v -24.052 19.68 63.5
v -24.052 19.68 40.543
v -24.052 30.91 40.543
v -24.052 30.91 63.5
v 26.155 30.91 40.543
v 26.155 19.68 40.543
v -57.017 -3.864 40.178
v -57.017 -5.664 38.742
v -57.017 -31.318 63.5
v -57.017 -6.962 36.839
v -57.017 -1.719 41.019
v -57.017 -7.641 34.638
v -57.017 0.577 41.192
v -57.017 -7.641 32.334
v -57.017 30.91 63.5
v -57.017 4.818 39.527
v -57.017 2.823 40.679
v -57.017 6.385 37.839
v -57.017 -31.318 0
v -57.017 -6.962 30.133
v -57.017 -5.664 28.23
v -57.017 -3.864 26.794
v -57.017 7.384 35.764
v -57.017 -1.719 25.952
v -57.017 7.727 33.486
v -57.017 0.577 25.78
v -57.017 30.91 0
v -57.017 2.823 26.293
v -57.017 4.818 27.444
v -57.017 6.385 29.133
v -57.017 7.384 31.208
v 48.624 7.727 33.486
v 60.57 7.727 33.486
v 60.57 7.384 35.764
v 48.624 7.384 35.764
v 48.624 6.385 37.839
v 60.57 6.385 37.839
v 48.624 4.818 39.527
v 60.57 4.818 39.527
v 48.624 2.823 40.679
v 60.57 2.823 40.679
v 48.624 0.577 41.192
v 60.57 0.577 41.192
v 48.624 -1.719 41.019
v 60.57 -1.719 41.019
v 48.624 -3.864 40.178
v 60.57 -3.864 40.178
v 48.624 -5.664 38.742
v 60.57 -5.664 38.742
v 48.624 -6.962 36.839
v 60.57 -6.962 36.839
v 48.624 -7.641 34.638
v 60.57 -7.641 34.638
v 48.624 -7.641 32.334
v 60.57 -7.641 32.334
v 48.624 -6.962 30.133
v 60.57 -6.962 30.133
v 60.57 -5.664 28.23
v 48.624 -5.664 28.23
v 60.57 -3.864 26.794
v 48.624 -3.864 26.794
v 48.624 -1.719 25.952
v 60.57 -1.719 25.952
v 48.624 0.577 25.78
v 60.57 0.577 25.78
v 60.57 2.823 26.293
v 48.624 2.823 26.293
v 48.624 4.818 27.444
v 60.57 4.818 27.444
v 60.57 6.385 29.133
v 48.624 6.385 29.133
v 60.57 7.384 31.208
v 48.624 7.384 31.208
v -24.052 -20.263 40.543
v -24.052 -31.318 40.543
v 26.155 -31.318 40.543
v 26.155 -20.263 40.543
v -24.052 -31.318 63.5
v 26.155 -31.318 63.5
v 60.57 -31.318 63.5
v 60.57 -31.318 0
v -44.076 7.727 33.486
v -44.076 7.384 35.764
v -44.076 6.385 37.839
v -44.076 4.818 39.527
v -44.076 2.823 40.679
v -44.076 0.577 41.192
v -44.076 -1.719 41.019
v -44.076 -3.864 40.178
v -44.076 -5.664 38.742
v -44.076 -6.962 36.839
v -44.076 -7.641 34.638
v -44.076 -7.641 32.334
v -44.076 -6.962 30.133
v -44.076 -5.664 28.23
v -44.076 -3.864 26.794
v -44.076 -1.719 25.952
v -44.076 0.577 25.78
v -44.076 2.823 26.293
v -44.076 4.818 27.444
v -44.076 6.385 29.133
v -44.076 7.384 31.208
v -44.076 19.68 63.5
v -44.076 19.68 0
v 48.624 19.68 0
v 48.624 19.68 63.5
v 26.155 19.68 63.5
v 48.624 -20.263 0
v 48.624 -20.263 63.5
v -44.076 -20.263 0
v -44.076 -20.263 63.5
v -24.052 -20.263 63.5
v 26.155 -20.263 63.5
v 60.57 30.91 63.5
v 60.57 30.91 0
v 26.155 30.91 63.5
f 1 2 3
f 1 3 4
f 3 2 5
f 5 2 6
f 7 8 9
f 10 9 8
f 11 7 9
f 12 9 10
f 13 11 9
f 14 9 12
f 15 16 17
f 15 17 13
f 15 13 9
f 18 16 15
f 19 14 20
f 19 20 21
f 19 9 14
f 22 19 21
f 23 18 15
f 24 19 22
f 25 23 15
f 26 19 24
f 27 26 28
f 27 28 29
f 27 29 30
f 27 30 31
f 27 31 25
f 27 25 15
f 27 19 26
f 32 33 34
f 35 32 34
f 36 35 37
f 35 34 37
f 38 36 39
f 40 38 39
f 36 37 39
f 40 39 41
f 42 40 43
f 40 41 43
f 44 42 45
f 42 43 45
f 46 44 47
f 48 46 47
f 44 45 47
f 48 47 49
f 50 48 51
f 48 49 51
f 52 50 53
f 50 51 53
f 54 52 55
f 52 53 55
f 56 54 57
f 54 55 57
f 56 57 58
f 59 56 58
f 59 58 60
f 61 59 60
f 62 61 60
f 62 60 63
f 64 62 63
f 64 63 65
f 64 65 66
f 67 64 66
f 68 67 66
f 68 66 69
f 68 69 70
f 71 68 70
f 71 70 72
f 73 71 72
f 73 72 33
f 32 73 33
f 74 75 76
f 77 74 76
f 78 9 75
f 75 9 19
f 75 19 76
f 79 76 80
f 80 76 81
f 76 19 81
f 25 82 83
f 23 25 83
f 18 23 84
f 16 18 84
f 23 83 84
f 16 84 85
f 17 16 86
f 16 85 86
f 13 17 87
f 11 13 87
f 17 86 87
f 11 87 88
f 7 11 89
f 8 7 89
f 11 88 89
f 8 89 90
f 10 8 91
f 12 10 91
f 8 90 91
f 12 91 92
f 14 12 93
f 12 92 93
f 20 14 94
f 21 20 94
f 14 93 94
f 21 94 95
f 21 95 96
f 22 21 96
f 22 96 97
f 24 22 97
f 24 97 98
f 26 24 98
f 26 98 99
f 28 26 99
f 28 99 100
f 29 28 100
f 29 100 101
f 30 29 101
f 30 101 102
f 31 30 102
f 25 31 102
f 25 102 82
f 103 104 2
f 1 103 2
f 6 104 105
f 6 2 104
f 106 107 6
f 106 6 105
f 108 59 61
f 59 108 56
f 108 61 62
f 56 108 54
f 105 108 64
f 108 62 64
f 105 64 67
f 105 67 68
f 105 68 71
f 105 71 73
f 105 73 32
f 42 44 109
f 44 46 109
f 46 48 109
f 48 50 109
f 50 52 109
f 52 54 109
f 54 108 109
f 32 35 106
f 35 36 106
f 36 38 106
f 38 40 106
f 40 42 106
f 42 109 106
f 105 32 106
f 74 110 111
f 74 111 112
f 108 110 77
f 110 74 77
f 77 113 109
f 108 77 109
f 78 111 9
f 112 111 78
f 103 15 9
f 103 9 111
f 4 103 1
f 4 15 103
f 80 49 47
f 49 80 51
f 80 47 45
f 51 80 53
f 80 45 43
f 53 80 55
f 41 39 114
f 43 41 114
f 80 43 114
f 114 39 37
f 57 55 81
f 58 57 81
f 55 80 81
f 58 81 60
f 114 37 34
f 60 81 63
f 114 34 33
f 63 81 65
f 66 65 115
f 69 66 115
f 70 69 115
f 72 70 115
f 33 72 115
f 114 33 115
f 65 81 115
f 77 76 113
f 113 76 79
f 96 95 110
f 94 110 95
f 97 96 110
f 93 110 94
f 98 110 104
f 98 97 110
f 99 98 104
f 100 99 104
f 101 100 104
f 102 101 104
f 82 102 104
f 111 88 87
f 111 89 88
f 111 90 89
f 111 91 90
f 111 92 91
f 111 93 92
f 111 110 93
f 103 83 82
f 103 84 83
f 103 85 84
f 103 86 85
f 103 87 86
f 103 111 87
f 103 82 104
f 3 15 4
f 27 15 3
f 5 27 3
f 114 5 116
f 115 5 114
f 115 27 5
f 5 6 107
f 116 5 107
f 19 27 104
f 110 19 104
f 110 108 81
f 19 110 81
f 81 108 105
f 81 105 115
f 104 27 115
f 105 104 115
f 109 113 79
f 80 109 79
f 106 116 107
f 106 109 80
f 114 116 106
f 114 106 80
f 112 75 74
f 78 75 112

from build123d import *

# Parameters (mm, degrees)
F4_W     = 117.5877898932
F4_H     = 62.227293849
F0_DEPTH = 63.5
F5_W     = 92.6998779178
F5_H     = 39.9431586266
F1_DEPTH = 63.501
F2_R     = 7.7272697415
F3_DEPTH = 117.5887898932
F6_W     = 50.2068921924
F6_H     = 22.9567790627
F7_DEPTH = 62.228293849


with BuildPart() as f0:
    # F4 (on Top) → F0 (new body)
    with BuildSketch(Plane.XY):
        with Locations((1.7765834928, -0.2040341496)):
            Rectangle(F4_W, F4_H)
    extrude(amount=F0_DEPTH)

    # F5 (on face) → F1 (cut, through all)
    with BuildSketch(Plane.XY.offset(63.5)):
        with Locations((2.2740103304, -0.2917349339)):
            Rectangle(F5_W, F5_H)
    extrude(amount=-F1_DEPTH, mode=Mode.SUBTRACT)

    # F2 (on face) → F3 (cut, through all)
    with BuildSketch(Plane.YZ.offset(60.5704784393)):
        with Locations((0, 33.4859117866)):
            Circle(F2_R)
    extrude(amount=-F3_DEPTH, mode=Mode.SUBTRACT)

    # F6 (on face) → F7 (cut, through all)
    with BuildSketch(Plane.XZ.offset(31.3176810741)):
        with Locations((1.0511763394, 52.0216104686)):
            Rectangle(F6_W, F6_H)
    extrude(amount=-F7_DEPTH, mode=Mode.SUBTRACT)


solid = f0.part
